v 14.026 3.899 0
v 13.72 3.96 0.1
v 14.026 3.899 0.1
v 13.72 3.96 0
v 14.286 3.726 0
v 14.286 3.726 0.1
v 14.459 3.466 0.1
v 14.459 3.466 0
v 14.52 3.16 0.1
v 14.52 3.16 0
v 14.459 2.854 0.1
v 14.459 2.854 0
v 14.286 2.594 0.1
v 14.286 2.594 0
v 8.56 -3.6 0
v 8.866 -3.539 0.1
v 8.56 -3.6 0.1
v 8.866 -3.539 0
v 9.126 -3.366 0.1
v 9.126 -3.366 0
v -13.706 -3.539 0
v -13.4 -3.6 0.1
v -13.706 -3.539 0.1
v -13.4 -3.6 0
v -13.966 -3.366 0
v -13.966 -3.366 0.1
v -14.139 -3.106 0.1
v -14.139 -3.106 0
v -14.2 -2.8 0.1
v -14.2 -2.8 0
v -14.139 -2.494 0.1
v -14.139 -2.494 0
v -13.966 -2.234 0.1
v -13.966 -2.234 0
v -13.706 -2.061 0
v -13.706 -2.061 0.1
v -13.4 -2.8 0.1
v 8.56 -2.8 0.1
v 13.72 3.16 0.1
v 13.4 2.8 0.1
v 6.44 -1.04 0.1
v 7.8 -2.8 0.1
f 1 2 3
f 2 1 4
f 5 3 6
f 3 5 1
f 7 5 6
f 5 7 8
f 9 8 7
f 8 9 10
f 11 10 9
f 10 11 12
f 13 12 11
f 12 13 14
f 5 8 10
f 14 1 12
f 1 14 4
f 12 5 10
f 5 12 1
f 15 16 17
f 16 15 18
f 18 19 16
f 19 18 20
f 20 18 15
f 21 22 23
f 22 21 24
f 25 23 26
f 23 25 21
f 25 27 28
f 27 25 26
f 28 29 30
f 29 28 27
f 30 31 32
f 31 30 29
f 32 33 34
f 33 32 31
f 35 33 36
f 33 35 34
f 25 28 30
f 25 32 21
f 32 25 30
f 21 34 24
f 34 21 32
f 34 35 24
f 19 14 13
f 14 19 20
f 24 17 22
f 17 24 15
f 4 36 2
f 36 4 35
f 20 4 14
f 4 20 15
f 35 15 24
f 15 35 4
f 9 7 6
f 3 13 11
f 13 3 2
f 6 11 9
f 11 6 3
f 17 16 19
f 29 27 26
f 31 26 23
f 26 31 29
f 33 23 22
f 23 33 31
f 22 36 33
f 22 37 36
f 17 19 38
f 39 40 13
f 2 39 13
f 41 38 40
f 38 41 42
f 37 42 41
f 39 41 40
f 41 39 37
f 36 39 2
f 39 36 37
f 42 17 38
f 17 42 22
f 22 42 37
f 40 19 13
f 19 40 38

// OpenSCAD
// file: ../p/7-16cyli.scad
use <../lib.scad>
function ldraw_lib__7_16cyli() = [
// 0 Cylinder 0.4375
// 0 Name: 7-16cyli.dat
// 0 Author: Guy Vivan [guyvivan]
// 0 !LDRAW_ORG Primitive UPDATE 2009-01
// 0 !LICENSE Licensed under CC BY 2.0 and CC BY 4.0 : see CAreadme.txt
// 
// 0 BFC CERTIFY CCW
  [0,"BFC","CERTIFY"],
  [0,"BFC","CCW"],
// 
// 0 !HISTORY 2009-05-02 [PTadmin] Official Update 2009-01
// 
// 
// 4 16 0.9239 0 0.3827 1 0 0 1 1 0 0.9239 1 0.3827
  [4,16,0.9239,0,0.3827,1,0,0,1,1,0,0.9239,1,0.3827],
// 4 16 0.7071 0 0.7071 0.9239 0 0.3827 0.9239 1 0.3827 0.7071 1 0.7071
  [4,16,0.7071,0,0.7071,0.9239,0,0.3827,0.9239,1,0.3827,0.7071,1,0.7071],
// 4 16 0.3827 0 0.9239 0.7071 0 0.7071 0.7071 1 0.7071 0.3827 1 0.9239
  [4,16,0.3827,0,0.9239,0.7071,0,0.7071,0.7071,1,0.7071,0.3827,1,0.9239],
// 4 16 0 0 1 0.3827 0 0.9239 0.3827 1 0.9239 0 1 1
  [4,16,0,0,1,0.3827,0,0.9239,0.3827,1,0.9239,0,1,1],
// 4 16 -0.3827 0 0.9239 0 0 1 0 1 1 -0.3827 1 0.9239
  [4,16,-0.3827,0,0.9239,0,0,1,0,1,1,-0.3827,1,0.9239],
// 4 16 -0.7071 0 0.7071 -0.3827 0 0.9239 -0.3827 1 0.9239 -0.7071 1 0.7071
  [4,16,-0.7071,0,0.7071,-0.3827,0,0.9239,-0.3827,1,0.9239,-0.7071,1,0.7071],
// 4 16 -0.9239 0 0.3827 -0.7071 0 0.7071 -0.7071 1 0.7071 -0.9239 1 0.3827
  [4,16,-0.9239,0,0.3827,-0.7071,0,0.7071,-0.7071,1,0.7071,-0.9239,1,0.3827],
// 
// 0 conditional lines
// 5 24 1 1 0 1 0 0 1 1 -1 0.9239 1 0.3827
  [5,24,1,1,0,1,0,0,1,1,-1,0.9239,1,0.3827],
// 5 24 0.9239 1 0.3827 0.9239 0 0.3827 1 1 0 0.7071 1 0.7071
  [5,24,0.9239,1,0.3827,0.9239,0,0.3827,1,1,0,0.7071,1,0.7071],
// 5 24 0.7071 1 0.7071 0.7071 0 0.7071 0.9239 1 0.3827 0.3827 1 0.9239
  [5,24,0.7071,1,0.7071,0.7071,0,0.7071,0.9239,1,0.3827,0.3827,1,0.9239],
// 5 24 0.3827 1 0.9239 0.3827 0 0.9239 0.7071 1 0.7071 0 1 1
  [5,24,0.3827,1,0.9239,0.3827,0,0.9239,0.7071,1,0.7071,0,1,1],
// 5 24 0 1 1 0 0 1 0.3827 1 0.9239 -0.3827 1 0.9239
  [5,24,0,1,1,0,0,1,0.3827,1,0.9239,-0.3827,1,0.9239],
// 5 24 -0.3827 1 0.9239 -0.3827 0 0.9239 0 1 1 -0.7071 1 0.7071
  [5,24,-0.3827,1,0.9239,-0.3827,0,0.9239,0,1,1,-0.7071,1,0.7071],
// 5 24 -0.7071 1 0.7071 -0.7071 0 0.7071 -0.3827 1 0.9239 -0.9239 1 0.3827
  [5,24,-0.7071,1,0.7071,-0.7071,0,0.7071,-0.3827,1,0.9239,-0.9239,1,0.3827],
// 5 24 -0.9239 1 0.3827 -0.9239 0 0.3827 -1.3066 1 -0.5412 -0.7071 1 0.7071
  [5,24,-0.9239,1,0.3827,-0.9239,0,0.3827,-1.3066,1,-0.5412,-0.7071,1,0.7071],
// 
// 0 end of file
];
module ldraw_lib__7_16cyli(step=0, col=false, unit=2/5, alt=false, line=0.2, solid=!$preview)
    makepoly(ldraw_lib__7_16cyli(), step=step, col=col, unit=unit, alt=alt, line=line, solid=solid);
ldraw_lib__7_16cyli(line=0.2);
// file: ../p/7-16chrd.scad
use <../lib.scad>
function ldraw_lib__7_16chrd() = [
// 0 Chord 0.4375
// 0 Name: 7-16chrd.dat
// 0 Author: Guy Vivan [guyvivan]
// 0 !LDRAW_ORG Primitive UPDATE 2009-03
// 0 !LICENSE Licensed under CC BY 2.0 and CC BY 4.0 : see CAreadme.txt
// 
// 0 BFC CERTIFY CCW
  [0,"BFC","CERTIFY"],
  [0,"BFC","CCW"],
// 
// 0 !HISTORY 2009-12-29 [PTadmin] Official Update 2009-03
// 
// 
// 3 16 0.7071 0 0.7071 0.3827 0 0.9239 0 0 1
  [3,16,0.7071,0,0.7071,0.3827,0,0.9239,0,0,1],
// 4 16 0.7071 0 0.7071 0 0 1 -0.3827 0 0.9239 0.9239 0 0.3827
  [4,16,0.7071,0,0.7071,0,0,1,-0.3827,0,0.9239,0.9239,0,0.3827],
// 4 16 0.9239 0 0.3827 -0.3827 0 0.9239 -0.7071 0 0.7071 1 0 0
  [4,16,0.9239,0,0.3827,-0.3827,0,0.9239,-0.7071,0,0.7071,1,0,0],
// 3 16 -0.7071 0 0.7071 -0.9239 0 0.3827 1 0 0
  [3,16,-0.7071,0,0.7071,-0.9239,0,0.3827,1,0,0],
// 0
];
module ldraw_lib__7_16chrd(step=0, col=false, unit=2/5, alt=false, line=0.2, solid=!$preview)
    makepoly(ldraw_lib__7_16chrd(), step=step, col=col, unit=unit, alt=alt, line=line, solid=solid);
ldraw_lib__7_16chrd(line=0.2);
// file: ../p/3-8cyli.scad
use <../lib.scad>
function ldraw_lib__3_8cyli() = [
// 0 Cylinder 0.375
// 0 Name: 3-8cyli.dat
// 0 Author: James Jessiman
// 0 !LDRAW_ORG Primitive UPDATE 2005-01
// 0 !LICENSE Licensed under CC BY 4.0 : see CAreadme.txt
// 
// 0 BFC CERTIFY CCW
  [0,"BFC","CERTIFY"],
  [0,"BFC","CCW"],
// 
// 0 !HISTORY 2002-05-08 [OrionP] Made BFC compliant
// 0 !HISTORY 2002-08-18 [PTadmin] Official Update 2002-04
// 0 !HISTORY 2004-12-11 [nielsk] Recreated using Primitive Generator, Edge lines fixed, BFC changed to CCW
// 0 !HISTORY 2005-12-28 [PTadmin] Official Update 2005-01
// 0 !HISTORY 2007-06-24 [PTadmin] Header formatted for Contributor Agreement
// 0 !HISTORY 2008-07-01 [PTadmin] Official Update 2008-01
// 
// 
// 4 16 .9239 1 .3827 .9239 0 .3827 1 0 0 1 1 0
  [4,16,.9239,1,.3827,.9239,0,.3827,1,0,0,1,1,0],
// 4 16 .7071 1 .7071 .7071 0 .7071 .9239 0 .3827 .9239 1 .3827
  [4,16,.7071,1,.7071,.7071,0,.7071,.9239,0,.3827,.9239,1,.3827],
// 4 16 .3827 1 .9239 .3827 0 .9239 .7071 0 .7071 .7071 1 .7071
  [4,16,.3827,1,.9239,.3827,0,.9239,.7071,0,.7071,.7071,1,.7071],
// 4 16 0 1 1 0 0 1 .3827 0 .9239 .3827 1 .9239
  [4,16,0,1,1,0,0,1,.3827,0,.9239,.3827,1,.9239],
// 4 16 -.3827 1 .9239 -.3827 0 .9239 0 0 1 0 1 1
  [4,16,-.3827,1,.9239,-.3827,0,.9239,0,0,1,0,1,1],
// 4 16 -.7071 1 .7071 -.7071 0 .7071 -.3827 0 .9239 -.3827 1 .9239
  [4,16,-.7071,1,.7071,-.7071,0,.7071,-.3827,0,.9239,-.3827,1,.9239],
// 5 24 1 1 0 1 0 0 1 1 -.4142 .9239 1 .3827
  [5,24,1,1,0,1,0,0,1,1,-.4142,.9239,1,.3827],
// 5 24 .9239 1 .3827 .9239 0 .3827 1 1 0 .7071 1 .7071
  [5,24,.9239,1,.3827,.9239,0,.3827,1,1,0,.7071,1,.7071],
// 5 24 .7071 1 .7071 .7071 0 .7071 .9239 1 .3827 .3827 1 .9239
  [5,24,.7071,1,.7071,.7071,0,.7071,.9239,1,.3827,.3827,1,.9239],
// 5 24 .3827 1 .9239 .3827 0 .9239 .7071 1 .7071 0 1 1
  [5,24,.3827,1,.9239,.3827,0,.9239,.7071,1,.7071,0,1,1],
// 5 24 0 1 1 0 0 1 .3827 1 .9239 -.3827 1 .9239
  [5,24,0,1,1,0,0,1,.3827,1,.9239,-.3827,1,.9239],
// 5 24 -.3827 1 .9239 -.3827 0 .9239 0 1 1 -.7071 1 .7071
  [5,24,-.3827,1,.9239,-.3827,0,.9239,0,1,1,-.7071,1,.7071],
// 5 24 -.7071 1 .7071 -.7071 0 .7071 -.3827 1 .9239 -1 1 .4142
  [5,24,-.7071,1,.7071,-.7071,0,.7071,-.3827,1,.9239,-1,1,.4142],
// 0
];
module ldraw_lib__3_8cyli(step=0, col=false, unit=2/5, alt=false, line=0.2, solid=!$preview)
    makepoly(ldraw_lib__3_8cyli(), step=step, col=col, unit=unit, alt=alt, line=line, solid=solid);
ldraw_lib__3_8cyli(line=0.2);
// file: ../p/3-8chrd.scad
use <../lib.scad>
function ldraw_lib__3_8chrd() = [
// 0 Chord 0.375
// 0 Name: 3-8chrd.dat
// 0 Author: Donald Sutter [technog]
// 0 !LDRAW_ORG Primitive UPDATE 2005-01
// 0 !LICENSE Licensed under CC BY 4.0 : see CAreadme.txt
// 
// 0 BFC CERTIFY CCW
  [0,"BFC","CERTIFY"],
  [0,"BFC","CCW"],
// 
// 0 !HISTORY 2004-01-07 [Steffen] added primitive code for POVray
// 0 !HISTORY 2004-03-18 [mkennedy] removed pov code and rearanged polygons.
// 0 !HISTORY 2004-09-12 [cwdee] reversed winding and standardised precision
// 0 !HISTORY 2005-12-28 [PTadmin] Official Update 2005-01
// 0 !HISTORY 2007-06-24 [PTadmin] Header formatted for Contributor Agreement
// 0 !HISTORY 2008-07-01 [PTadmin] Official Update 2008-01
// 
// 
// 3 16 0.7071 0 0.7071 0.3827 0 0.9239 0 0 1
  [3,16,0.7071,0,0.7071,0.3827,0,0.9239,0,0,1],
// 4 16 0.9239 0 0.3827 -0.3827 0 0.9239 -0.7071 0 0.7071 1 0 0
  [4,16,0.9239,0,0.3827,-0.3827,0,0.9239,-0.7071,0,0.7071,1,0,0],
// 4 16 0.7071 0 0.7071 0 0 1 -0.3827 0 0.9239 0.9239 0 0.3827
  [4,16,0.7071,0,0.7071,0,0,1,-0.3827,0,0.9239,0.9239,0,0.3827],
// 0
];
module ldraw_lib__3_8chrd(step=0, col=false, unit=2/5, alt=false, line=0.2, solid=!$preview)
    makepoly(ldraw_lib__3_8chrd(), step=step, col=col, unit=unit, alt=alt, line=line, solid=solid);
ldraw_lib__3_8chrd(line=0.2);
// file: ../p/1-8cyli.scad
use <../lib.scad>
function ldraw_lib__1_8cyli() = [
// 0 Cylinder 0.125
// 0 Name: 1-8cyli.dat
// 0 Author: James Jessiman
// 0 !LDRAW_ORG Primitive UPDATE 2005-01
// 0 !LICENSE Licensed under CC BY 4.0 : see CAreadme.txt
// 
// 0 BFC CERTIFY CCW
  [0,"BFC","CERTIFY"],
  [0,"BFC","CCW"],
// 
// 0 !HISTORY 2002-04-25 [PTadmin] Official Update 2002-02
// 0 !HISTORY 2004-12-11 [nielsk] Recreated using Primitive Generator, Edge lines fixed, BFC changed to CCW
// 0 !HISTORY 2005-12-28 [PTadmin] Official Update 2005-01
// 0 !HISTORY 2007-06-22 [PTadmin] Header formatted for Contributor Agreement
// 0 !HISTORY 2008-07-01 [PTadmin] Official Update 2008-01
// 
// 
// 4 16 .9239 1 .3827 .9239 0 .3827 1 0 0 1 1 0
  [4,16,.9239,1,.3827,.9239,0,.3827,1,0,0,1,1,0],
// 4 16 .7071 1 .7071 .7071 0 .7071 .9239 0 .3827 .9239 1 .3827
  [4,16,.7071,1,.7071,.7071,0,.7071,.9239,0,.3827,.9239,1,.3827],
// 5 24 1 1 0 1 0 0 1 1 -.4142 .9239 1 .3827
  [5,24,1,1,0,1,0,0,1,1,-.4142,.9239,1,.3827],
// 5 24 .9239 1 .3827 .9239 0 .3827 1 1 0 .7071 1 .7071
  [5,24,.9239,1,.3827,.9239,0,.3827,1,1,0,.7071,1,.7071],
// 5 24 .7071 1 .7071 .7071 0 .7071 .9239 1 .3827 .4142 1 1
  [5,24,.7071,1,.7071,.7071,0,.7071,.9239,1,.3827,.4142,1,1],
// 0
];
module ldraw_lib__1_8cyli(step=0, col=false, unit=2/5, alt=false, line=0.2, solid=!$preview)
    makepoly(ldraw_lib__1_8cyli(), step=step, col=col, unit=unit, alt=alt, line=line, solid=solid);
ldraw_lib__1_8cyli(line=0.2);
// file: ../p/1-8chrd.scad
use <../lib.scad>
function ldraw_lib__1_8chrd() = [
// 0 Chord 0.125
// 0 Name: 1-8chrd.dat
// 0 Author: Orion Pobursky [OrionP]
// 0 !LDRAW_ORG Primitive UPDATE 2023-05
// 0 !LICENSE Licensed under CC BY 4.0 : see CAreadme.txt
// 
// 0 BFC CERTIFY CCW
  [0,"BFC","CERTIFY"],
  [0,"BFC","CCW"],
// 
// 0 !HISTORY 2004-04-22 [PTadmin] Official Update 2004-02
// 0 !HISTORY 2007-06-22 [PTadmin] Header formatted for Contributor Agreement
// 0 !HISTORY 2008-07-01 [PTadmin] Official Update 2008-01
// 0 !HISTORY 2023-10-27 [OrionP] Rebuilt with PrimGen2, original author westrate
// 0 !HISTORY 2023-10-31 [OrionP] Official Update 2023-05
// 
// 3 16 1 0 0 0.9239 0 0.3827 0.7071 0 0.7071
  [3,16,1,0,0,0.9239,0,0.3827,0.7071,0,0.7071],
];
module ldraw_lib__1_8chrd(step=0, col=false, unit=2/5, alt=false, line=0.2, solid=!$preview)
    makepoly(ldraw_lib__1_8chrd(), step=step, col=col, unit=unit, alt=alt, line=line, solid=solid);
ldraw_lib__1_8chrd(line=0.2);
// file: 170882a.scad
use <../lib.scad>
use <../p/1-8chrd.scad>
use <../p/1-8cyli.scad>
use <../p/3-8chrd.scad>
use <../p/3-8cyli.scad>
use <../p/7-16chrd.scad>
use <../p/7-16cyli.scad>
function ldraw_lib__170882a() = [
// 0 Sticker  0.9 x  3.6 Triangle with Black Outline and Red and Blue Filling (Tip Right)
// 0 Name: 170882a.dat
// 0 Author: Gerald Lasser [GeraldLasser]
// 0 !LDRAW_ORG Part UPDATE 2023-06
// 0 !LICENSE Licensed under CC BY 4.0 : see CAreadme.txt
// 
// 0 BFC CERTIFY CCW
  [0,"BFC","CERTIFY"],
  [0,"BFC","CCW"],
// 
// 0 !KEYWORDS Set 4559
// 
// 0 !HISTORY 2023-11-19 [OrionP] Official Update 2023-06
// 
// 
// 0 // Box
// 
// 1 16 -34.3 -.25 7.9 0 0 -2 0 .25 0 2 0 0 3-8cyli.dat
  [1,16,-34.3,-.25,7.9,0,0,-2,0,.25,0,2,0,0, ldraw_lib__3_8cyli()],
// 1 16 -34.3 0 7.9 0 0 -2 0 -1 0 2 0 0 3-8chrd.dat
  [1,16,-34.3,0,7.9,0,0,-2,0,-1,0,2,0,0, ldraw_lib__3_8chrd()],
// 1 16 -21.4 -.25 -7 0 0 -2 0 .25 0 -2 0 0 1-8cyli.dat
  [1,16,-21.4,-.25,-7,0,0,-2,0,.25,0,-2,0,0, ldraw_lib__1_8cyli()],
// 1 16 -21.4 0 -7 0 0 -2 0 -1 0 -2 0 0 1-8chrd.dat
  [1,16,-21.4,0,-7,0,0,-2,0,-1,0,-2,0,0, ldraw_lib__1_8chrd()],
// 1 16 33.5 -.25 -7 0 0 2 0 .25 0 -2 0 0 7-16cyli.dat
  [1,16,33.5,-.25,-7,0,0,2,0,.25,0,-2,0,0, ldraw_lib__7_16cyli()],
// 1 16 33.5 0 -7 0 0 2 0 -1 0 -2 0 0 7-16chrd.dat
  [1,16,33.5,0,-7,0,0,2,0,-1,0,-2,0,0, ldraw_lib__7_16chrd()],
// 4 16 -22.8142 -.25 -8.4142 -35.7142 -.25 6.4858 -35.7142 0 6.4858 -22.8142 0 -8.4142
  [4,16,-22.8142,-.25,-8.4142,-35.7142,-.25,6.4858,-35.7142,0,6.4858,-22.8142,0,-8.4142],
// 4 16 33.5 -.25 -9 -21.4 -.25 -9 -21.4 0 -9 33.5 0 -9
  [4,16,33.5,-.25,-9,-21.4,-.25,-9,-21.4,0,-9,33.5,0,-9],
// 4 16 -34.3 -.25 9.9 34.2654 -.25 -5.1522 34.2654 0 -5.1522 -34.3 0 9.9
  [4,16,-34.3,-.25,9.9,34.2654,-.25,-5.1522,34.2654,0,-5.1522,-34.3,0,9.9],
// 4 16 -22.8142 0 -8.4142 -35.7142 0 6.4858 -34.3 0 9.9 -21.4 0 -9
  [4,16,-22.8142,0,-8.4142,-35.7142,0,6.4858,-34.3,0,9.9,-21.4,0,-9],
// 4 16 33.5 0 -9 -21.4 0 -9 -34.3 0 9.9 34.2654 0 -5.1522
  [4,16,33.5,0,-9,-21.4,0,-9,-34.3,0,9.9,34.2654,0,-5.1522],
// 5 24 -22.8142 0 -8.4142 -22.8142 -.25 -8.4142 -22.1654 0 -8.8478 -35.7142 0 6.4858
  [5,24,-22.8142,0,-8.4142,-22.8142,-.25,-8.4142,-22.1654,0,-8.8478,-35.7142,0,6.4858],
// 5 24 -35.7142 0 6.4858 -35.7142 -.25 6.4858 -36.1478 0 7.1346 -22.8142 0 -8.4142
  [5,24,-35.7142,0,6.4858,-35.7142,-.25,6.4858,-36.1478,0,7.1346,-22.8142,0,-8.4142],
// 5 24 -34.3 -.25 9.9 -34.3 0 9.9 -35.0654 0 9.7478 34.2654 0 -5.1522
  [5,24,-34.3,-.25,9.9,-34.3,0,9.9,-35.0654,0,9.7478,34.2654,0,-5.1522],
// 5 24 34.2654 -.25 -5.1522 34.2654 0 -5.1522 34.9142 0 -5.5858 -34.3 0 9.9
  [5,24,34.2654,-.25,-5.1522,34.2654,0,-5.1522,34.9142,0,-5.5858,-34.3,0,9.9],
// 
// 1 0 -34.3 -.25 7.9 0 0 -2 0 1 0 2 0 0 3-8chrd.dat
  [1,0,-34.3,-.25,7.9,0,0,-2,0,1,0,2,0,0, ldraw_lib__3_8chrd()],
// 1 0 -21.4 -.25 -7 0 0 -2 0 1 0 -2 0 0 1-8chrd.dat
  [1,0,-21.4,-.25,-7,0,0,-2,0,1,0,-2,0,0, ldraw_lib__1_8chrd()],
// 1 0 33.5 -0.25 -7 0 0 2 0 1 0 -2 0 0 7-16chrd.dat
  [1,0,33.5,-0.25,-7,0,0,2,0,1,0,-2,0,0, ldraw_lib__7_16chrd()],
// 3 0 34.2654 -.25 -5.1522 33.5 -.25 -7 33.5 -.25 -9
  [3,0,34.2654,-.25,-5.1522,33.5,-.25,-7,33.5,-.25,-9],
// 3 0 -21.4 -.25 -7 -22.8142 -.25 -8.4142 -21.4 -.25 -9
  [3,0,-21.4,-.25,-7,-22.8142,-.25,-8.4142,-21.4,-.25,-9],
// 3 0 -35.7142 -.25 6.4858 -33.5 -.25 7 -34.3 -.25 7.9
  [3,0,-35.7142,-.25,6.4858,-33.5,-.25,7,-34.3,-.25,7.9],
// 3 0 -35.7142 -.25 6.4858 -34.3 -.25 7.9 -34.3 -.25 9.9
  [3,0,-35.7142,-.25,6.4858,-34.3,-.25,7.9,-34.3,-.25,9.9],
// 4 1 -16.1 -0.25 -2.6 -33.5 -0.25 7 -21.4 -0.25 -7 -19.5 -0.25 -7
  [4,1,-16.1,-0.25,-2.6,-33.5,-0.25,7,-21.4,-0.25,-7,-19.5,-0.25,-7],
// 3 4 -16.1 -0.25 -2.6 -19.5 -0.25 -7 33.5 -0.25 -7
  [3,4,-16.1,-0.25,-2.6,-19.5,-0.25,-7,33.5,-0.25,-7],
// 4 4 -33.5 -0.25 7 -16.1 -0.25 -2.6 33.5 -0.25 -7 -34.3 -0.25 7.9
  [4,4,-33.5,-0.25,7,-16.1,-0.25,-2.6,33.5,-0.25,-7,-34.3,-0.25,7.9],
// 4 0 -34.3 -.25 7.9 33.5 -.25 -7 34.2654 -.25 -5.1522 -34.3 -.25 9.9
  [4,0,-34.3,-.25,7.9,33.5,-.25,-7,34.2654,-.25,-5.1522,-34.3,-.25,9.9],
// 4 0 -19.5 -.25 -7 -21.4 -.25 -7 -21.4 -.25 -9 33.5 -.25 -9
  [4,0,-19.5,-.25,-7,-21.4,-.25,-7,-21.4,-.25,-9,33.5,-.25,-9],
// 3 0 33.5 -0.25 -7 -19.5 -0.25 -7 33.5 -0.25 -9
  [3,0,33.5,-0.25,-7,-19.5,-0.25,-7,33.5,-0.25,-9],
// 4 0 -33.5 -.25 7 -35.7142 -.25 6.4858 -22.8142 -.25 -8.4142 -21.4 -.25 -7
  [4,0,-33.5,-.25,7,-35.7142,-.25,6.4858,-22.8142,-.25,-8.4142,-21.4,-.25,-7],
];
module ldraw_lib__170882a(step=0, col=false, unit=2/5, alt=false, line=0.2, solid=!$preview)
    makepoly(ldraw_lib__170882a(), step=step, col=col, unit=unit, alt=alt, line=line, solid=solid);
ldraw_lib__170882a(line=0.2);
// main file
use <../lib.scad>
use <170882a.scad>
function ldraw_lib__170882b() = [
// 0 Sticker  0.9 x  3.6 Triangle with Black Outline and Red and Blue Filling (Tip Left)
// 0 Name: 170882b.dat
// 0 Author: Gerald Lasser [GeraldLasser]
// 0 !LDRAW_ORG Part UPDATE 2023-06
// 0 !LICENSE Licensed under CC BY 4.0 : see CAreadme.txt
// 
// 0 BFC CERTIFY CCW
  [0,"BFC","CERTIFY"],
  [0,"BFC","CCW"],
// 
// 0 !KEYWORDS Set 4559
// 
// 0 !HISTORY 2023-11-19 [OrionP] Official Update 2023-06
// 
// 
// 1 16 0 0 0 -1 0 0 0 1 0 0 0 1 170882a.dat
  [1,16,0,0,0,-1,0,0,0,1,0,0,0,1, ldraw_lib__170882a()],
];
module ldraw_lib__170882b(step=0, col=false, unit=2/5, alt=false, line=0.2, solid=!$preview)
    makepoly(ldraw_lib__170882b(), step=step, col=col, unit=unit, alt=alt, line=line, solid=solid);
ldraw_lib__170882b(line=0.2);
